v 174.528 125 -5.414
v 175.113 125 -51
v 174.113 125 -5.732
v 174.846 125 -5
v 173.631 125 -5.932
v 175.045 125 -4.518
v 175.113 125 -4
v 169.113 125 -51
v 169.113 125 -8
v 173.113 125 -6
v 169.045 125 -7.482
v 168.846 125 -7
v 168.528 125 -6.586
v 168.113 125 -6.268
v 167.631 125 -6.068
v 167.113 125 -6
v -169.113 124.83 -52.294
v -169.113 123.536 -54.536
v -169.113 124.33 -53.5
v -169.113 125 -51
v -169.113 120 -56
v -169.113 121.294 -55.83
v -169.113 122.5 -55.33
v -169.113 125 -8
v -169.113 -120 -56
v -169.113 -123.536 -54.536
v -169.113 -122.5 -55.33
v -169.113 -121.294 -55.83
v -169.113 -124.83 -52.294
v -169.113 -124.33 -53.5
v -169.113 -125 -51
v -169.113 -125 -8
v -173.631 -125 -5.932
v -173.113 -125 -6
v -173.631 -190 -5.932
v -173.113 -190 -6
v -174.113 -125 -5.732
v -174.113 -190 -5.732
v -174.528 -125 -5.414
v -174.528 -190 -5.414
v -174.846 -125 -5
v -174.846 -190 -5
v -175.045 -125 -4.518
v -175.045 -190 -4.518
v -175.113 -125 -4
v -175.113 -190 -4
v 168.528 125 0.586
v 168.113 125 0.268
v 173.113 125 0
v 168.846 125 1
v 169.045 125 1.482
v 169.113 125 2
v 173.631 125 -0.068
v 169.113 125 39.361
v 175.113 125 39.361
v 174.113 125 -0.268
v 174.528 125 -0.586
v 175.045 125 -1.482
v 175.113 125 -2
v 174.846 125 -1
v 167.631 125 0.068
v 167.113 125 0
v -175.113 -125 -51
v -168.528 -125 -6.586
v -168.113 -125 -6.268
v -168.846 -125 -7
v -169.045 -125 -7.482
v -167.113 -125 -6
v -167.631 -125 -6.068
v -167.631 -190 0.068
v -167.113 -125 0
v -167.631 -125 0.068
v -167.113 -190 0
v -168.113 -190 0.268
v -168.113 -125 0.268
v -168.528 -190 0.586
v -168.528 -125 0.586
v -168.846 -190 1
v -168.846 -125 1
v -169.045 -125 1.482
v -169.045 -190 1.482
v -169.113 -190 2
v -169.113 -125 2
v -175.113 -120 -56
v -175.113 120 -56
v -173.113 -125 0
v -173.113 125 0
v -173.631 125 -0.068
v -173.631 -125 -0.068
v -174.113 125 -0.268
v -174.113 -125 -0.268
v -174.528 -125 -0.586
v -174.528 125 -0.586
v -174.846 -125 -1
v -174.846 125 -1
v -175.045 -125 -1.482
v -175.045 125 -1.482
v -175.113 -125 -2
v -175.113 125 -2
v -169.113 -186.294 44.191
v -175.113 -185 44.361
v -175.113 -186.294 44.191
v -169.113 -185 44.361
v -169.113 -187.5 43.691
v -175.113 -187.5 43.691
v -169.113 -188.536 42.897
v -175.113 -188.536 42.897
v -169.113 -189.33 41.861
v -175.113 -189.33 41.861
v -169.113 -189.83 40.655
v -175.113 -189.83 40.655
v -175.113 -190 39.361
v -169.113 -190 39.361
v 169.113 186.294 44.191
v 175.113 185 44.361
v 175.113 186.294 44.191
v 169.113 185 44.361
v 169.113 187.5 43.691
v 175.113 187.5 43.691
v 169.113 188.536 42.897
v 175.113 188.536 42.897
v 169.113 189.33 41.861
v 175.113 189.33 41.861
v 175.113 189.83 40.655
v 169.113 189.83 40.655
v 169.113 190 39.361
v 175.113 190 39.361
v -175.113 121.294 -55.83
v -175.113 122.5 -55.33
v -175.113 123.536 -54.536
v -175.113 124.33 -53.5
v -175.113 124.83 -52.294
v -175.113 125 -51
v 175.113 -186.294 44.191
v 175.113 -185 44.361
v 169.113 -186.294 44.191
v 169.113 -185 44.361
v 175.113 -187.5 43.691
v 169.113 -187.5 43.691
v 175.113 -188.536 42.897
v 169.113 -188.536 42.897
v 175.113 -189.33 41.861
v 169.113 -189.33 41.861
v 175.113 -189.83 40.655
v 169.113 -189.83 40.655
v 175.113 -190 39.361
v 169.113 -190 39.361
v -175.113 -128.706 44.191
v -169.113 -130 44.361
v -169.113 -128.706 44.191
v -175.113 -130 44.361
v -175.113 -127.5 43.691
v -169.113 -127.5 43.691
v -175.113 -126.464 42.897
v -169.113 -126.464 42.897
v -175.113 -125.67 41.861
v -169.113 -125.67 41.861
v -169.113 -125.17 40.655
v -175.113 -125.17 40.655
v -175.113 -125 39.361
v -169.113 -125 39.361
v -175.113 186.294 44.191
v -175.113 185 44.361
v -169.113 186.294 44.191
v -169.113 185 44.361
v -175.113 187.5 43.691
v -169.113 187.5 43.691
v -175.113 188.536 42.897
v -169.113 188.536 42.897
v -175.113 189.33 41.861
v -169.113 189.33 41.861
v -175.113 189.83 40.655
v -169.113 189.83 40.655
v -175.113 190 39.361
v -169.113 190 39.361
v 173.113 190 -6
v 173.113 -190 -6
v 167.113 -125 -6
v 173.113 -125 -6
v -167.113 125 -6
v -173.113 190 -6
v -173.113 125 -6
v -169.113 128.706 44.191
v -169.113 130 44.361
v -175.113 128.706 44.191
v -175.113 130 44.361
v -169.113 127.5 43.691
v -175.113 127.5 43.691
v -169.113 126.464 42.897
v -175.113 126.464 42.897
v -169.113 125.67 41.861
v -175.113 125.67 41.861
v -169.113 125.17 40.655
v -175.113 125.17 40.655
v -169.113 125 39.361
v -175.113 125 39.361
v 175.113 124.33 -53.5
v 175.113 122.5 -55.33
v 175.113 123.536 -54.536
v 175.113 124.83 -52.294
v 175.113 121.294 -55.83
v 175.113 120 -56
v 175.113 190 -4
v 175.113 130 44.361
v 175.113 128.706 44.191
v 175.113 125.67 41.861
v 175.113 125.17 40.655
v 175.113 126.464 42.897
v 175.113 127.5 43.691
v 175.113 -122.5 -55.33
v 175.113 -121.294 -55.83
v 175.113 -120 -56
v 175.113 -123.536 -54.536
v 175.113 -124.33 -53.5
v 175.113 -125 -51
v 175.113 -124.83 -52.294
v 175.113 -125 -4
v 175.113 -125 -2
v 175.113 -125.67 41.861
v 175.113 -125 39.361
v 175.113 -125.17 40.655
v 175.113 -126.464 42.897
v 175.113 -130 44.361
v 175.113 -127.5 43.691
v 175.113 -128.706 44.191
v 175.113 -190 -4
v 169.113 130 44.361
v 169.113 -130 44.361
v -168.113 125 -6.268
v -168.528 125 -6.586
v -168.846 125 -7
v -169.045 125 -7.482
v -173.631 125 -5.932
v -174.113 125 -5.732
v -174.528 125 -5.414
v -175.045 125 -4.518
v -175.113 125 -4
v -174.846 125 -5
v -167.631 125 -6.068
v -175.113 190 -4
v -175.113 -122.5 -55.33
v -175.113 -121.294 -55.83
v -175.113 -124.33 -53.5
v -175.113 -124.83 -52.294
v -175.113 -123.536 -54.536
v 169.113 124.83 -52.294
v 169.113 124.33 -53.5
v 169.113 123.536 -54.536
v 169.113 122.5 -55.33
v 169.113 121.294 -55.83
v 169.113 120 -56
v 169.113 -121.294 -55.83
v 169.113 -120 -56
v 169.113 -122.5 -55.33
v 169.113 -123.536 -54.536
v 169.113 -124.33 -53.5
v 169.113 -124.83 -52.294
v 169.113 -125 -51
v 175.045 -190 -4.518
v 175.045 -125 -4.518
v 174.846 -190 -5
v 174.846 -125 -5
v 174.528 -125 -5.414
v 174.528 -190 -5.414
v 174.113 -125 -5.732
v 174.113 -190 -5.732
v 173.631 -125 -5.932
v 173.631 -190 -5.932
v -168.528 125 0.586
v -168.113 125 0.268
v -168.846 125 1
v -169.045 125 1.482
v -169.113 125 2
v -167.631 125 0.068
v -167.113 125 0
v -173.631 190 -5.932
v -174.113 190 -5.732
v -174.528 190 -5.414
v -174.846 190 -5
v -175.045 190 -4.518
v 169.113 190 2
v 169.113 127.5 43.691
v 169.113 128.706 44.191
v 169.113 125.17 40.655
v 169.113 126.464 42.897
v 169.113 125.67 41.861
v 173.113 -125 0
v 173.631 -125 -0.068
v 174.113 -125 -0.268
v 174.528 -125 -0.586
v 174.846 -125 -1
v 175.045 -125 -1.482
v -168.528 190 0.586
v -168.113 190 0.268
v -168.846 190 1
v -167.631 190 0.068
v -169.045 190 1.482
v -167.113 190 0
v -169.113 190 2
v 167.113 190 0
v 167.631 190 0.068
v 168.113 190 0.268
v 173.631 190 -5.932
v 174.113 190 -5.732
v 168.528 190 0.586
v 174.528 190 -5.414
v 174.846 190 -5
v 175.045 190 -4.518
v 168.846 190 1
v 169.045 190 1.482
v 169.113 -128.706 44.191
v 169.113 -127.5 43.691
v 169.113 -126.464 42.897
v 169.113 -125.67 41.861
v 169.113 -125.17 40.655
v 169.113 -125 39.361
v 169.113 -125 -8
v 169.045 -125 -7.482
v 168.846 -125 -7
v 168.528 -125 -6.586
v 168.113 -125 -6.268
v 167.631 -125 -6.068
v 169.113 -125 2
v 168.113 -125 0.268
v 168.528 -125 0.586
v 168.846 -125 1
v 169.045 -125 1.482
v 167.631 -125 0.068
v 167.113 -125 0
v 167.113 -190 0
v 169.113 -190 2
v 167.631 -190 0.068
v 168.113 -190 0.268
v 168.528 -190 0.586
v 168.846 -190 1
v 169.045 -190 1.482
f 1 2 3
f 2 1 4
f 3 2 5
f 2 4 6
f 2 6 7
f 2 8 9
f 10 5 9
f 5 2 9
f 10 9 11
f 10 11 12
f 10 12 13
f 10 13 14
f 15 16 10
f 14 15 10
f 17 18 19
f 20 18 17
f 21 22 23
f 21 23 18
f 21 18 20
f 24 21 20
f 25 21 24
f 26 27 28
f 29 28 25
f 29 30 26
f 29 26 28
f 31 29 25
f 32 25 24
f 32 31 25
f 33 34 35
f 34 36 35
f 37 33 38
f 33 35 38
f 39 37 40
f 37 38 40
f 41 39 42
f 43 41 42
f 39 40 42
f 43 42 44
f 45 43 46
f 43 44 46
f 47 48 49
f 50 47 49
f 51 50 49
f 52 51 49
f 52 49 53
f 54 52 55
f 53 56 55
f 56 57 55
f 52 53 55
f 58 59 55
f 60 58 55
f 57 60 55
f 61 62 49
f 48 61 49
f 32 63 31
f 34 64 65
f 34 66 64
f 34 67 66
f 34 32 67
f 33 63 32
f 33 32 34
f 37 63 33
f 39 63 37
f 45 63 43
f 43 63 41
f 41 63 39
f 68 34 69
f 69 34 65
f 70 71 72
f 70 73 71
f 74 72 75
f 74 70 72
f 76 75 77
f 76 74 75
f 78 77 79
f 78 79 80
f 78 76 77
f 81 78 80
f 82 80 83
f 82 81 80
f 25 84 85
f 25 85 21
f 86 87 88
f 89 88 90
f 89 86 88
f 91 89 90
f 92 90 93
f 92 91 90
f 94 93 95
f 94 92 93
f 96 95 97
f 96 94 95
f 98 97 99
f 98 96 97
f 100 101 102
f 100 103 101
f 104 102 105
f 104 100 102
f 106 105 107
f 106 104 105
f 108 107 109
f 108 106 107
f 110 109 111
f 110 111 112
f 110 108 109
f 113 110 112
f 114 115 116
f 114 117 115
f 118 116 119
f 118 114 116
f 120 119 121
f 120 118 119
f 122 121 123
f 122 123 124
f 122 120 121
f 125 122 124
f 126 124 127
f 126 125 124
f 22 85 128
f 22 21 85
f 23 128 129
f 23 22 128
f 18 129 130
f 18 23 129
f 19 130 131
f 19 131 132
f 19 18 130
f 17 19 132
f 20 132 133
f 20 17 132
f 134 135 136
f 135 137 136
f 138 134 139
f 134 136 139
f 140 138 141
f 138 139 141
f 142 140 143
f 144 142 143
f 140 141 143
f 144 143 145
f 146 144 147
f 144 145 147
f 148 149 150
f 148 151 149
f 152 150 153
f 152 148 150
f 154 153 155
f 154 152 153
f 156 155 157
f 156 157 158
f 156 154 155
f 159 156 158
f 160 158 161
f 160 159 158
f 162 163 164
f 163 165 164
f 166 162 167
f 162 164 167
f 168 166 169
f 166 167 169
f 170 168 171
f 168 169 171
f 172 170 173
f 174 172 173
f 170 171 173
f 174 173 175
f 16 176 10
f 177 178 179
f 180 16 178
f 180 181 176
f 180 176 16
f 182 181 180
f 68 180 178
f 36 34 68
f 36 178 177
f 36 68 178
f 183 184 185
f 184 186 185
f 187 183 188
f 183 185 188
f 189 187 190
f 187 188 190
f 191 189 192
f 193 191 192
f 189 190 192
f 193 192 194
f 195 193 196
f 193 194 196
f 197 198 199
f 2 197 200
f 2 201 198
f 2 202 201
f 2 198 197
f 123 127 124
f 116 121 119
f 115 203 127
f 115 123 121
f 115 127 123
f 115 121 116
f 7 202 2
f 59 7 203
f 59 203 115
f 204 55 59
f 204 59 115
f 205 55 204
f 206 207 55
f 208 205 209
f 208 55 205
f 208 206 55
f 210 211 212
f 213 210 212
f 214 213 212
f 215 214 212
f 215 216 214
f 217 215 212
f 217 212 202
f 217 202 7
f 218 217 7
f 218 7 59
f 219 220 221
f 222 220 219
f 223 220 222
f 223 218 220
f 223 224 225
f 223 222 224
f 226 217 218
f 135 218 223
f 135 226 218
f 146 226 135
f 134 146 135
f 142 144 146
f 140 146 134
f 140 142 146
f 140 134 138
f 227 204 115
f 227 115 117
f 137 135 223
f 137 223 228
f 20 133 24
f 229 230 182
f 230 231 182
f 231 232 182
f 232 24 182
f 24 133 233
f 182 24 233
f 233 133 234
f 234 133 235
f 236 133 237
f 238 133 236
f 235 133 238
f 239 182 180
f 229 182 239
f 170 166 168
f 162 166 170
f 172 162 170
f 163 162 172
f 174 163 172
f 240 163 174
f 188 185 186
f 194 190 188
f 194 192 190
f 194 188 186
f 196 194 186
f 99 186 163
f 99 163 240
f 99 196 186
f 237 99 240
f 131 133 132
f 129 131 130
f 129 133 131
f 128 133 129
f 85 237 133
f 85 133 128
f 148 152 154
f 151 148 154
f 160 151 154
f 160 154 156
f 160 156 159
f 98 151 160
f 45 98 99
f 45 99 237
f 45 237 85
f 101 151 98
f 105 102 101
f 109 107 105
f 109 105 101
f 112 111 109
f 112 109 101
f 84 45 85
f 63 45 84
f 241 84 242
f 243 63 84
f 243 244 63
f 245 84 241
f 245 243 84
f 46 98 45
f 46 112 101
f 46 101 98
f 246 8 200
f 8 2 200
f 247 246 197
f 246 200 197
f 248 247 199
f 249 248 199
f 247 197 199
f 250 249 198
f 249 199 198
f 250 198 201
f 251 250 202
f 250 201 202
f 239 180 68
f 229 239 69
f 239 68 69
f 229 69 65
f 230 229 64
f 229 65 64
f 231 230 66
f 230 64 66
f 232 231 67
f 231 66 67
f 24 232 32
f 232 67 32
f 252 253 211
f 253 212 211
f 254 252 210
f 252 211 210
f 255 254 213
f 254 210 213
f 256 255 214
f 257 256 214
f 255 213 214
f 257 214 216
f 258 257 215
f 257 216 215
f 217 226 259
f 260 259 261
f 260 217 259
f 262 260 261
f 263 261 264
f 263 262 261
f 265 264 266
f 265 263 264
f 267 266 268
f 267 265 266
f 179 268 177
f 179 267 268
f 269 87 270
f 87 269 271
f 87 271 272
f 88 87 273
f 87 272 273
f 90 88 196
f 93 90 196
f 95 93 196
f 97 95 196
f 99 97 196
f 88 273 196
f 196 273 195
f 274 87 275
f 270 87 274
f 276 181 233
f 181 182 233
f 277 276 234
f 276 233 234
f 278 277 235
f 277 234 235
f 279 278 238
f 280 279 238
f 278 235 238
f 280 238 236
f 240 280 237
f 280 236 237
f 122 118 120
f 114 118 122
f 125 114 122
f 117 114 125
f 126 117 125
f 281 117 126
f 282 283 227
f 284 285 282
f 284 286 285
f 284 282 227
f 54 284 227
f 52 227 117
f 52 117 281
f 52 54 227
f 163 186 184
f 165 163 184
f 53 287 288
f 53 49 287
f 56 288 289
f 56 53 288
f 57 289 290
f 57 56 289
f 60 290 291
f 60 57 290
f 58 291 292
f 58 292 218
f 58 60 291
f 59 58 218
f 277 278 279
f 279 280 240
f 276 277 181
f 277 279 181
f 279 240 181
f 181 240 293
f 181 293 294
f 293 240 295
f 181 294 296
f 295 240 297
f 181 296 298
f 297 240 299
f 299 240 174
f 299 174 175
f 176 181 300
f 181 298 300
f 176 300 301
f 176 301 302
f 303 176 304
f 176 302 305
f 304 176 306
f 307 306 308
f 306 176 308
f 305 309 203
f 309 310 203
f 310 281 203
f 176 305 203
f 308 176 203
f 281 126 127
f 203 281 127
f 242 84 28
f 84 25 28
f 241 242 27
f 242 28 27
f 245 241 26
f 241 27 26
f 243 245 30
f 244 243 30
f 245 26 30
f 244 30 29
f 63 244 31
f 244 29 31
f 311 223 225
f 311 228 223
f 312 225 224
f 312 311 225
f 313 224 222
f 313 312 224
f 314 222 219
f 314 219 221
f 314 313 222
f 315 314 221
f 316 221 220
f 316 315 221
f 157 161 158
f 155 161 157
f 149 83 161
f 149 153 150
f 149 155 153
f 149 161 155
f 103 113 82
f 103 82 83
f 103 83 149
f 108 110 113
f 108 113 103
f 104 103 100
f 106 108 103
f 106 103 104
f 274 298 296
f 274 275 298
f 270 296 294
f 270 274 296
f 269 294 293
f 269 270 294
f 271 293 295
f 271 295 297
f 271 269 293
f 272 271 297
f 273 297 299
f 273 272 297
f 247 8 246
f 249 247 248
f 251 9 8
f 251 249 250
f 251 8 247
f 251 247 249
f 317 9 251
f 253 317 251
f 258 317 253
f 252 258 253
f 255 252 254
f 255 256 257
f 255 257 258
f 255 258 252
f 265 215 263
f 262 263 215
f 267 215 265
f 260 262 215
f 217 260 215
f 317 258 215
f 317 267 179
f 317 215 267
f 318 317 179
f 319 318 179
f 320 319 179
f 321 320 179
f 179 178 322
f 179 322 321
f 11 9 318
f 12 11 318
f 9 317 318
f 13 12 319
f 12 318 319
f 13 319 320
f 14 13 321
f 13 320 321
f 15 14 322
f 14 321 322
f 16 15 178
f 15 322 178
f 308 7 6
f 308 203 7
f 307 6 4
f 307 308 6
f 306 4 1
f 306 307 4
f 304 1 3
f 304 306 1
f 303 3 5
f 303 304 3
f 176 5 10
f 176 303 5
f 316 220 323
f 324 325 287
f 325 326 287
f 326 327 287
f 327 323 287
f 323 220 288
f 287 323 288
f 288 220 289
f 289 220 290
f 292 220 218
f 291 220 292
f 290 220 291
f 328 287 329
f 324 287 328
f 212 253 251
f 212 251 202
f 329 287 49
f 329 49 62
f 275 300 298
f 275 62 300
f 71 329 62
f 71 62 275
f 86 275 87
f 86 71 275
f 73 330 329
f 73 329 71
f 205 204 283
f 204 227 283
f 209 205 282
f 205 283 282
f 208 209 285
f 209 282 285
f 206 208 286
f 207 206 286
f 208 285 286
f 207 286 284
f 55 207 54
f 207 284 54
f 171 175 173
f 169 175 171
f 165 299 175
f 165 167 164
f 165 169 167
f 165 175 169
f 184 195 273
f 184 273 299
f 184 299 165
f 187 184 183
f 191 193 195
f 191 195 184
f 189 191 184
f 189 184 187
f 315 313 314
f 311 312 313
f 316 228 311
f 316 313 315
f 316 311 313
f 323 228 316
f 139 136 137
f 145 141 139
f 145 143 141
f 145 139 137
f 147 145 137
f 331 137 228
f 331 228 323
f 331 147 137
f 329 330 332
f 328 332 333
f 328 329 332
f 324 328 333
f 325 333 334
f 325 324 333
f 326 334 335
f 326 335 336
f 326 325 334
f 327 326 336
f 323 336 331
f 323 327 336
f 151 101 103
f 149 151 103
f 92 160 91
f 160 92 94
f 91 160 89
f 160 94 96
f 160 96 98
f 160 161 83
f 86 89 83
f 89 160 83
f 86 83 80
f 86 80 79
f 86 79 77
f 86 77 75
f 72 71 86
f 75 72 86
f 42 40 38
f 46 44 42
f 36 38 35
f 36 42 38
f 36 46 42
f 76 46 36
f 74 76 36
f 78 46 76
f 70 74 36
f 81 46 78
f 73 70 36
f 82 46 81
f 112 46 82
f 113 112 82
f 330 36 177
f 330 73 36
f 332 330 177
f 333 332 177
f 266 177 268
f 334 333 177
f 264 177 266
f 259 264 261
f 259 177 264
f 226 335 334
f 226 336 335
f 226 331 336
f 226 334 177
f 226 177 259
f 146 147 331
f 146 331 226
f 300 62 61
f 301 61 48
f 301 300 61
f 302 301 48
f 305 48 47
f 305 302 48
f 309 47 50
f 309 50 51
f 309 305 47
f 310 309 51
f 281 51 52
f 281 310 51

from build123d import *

# Parameters (mm, degrees)
F0_W     = 6
F0_H     = 44.3611480296
F1_DEPTH = 190
F3_DEPTH = 500
F4_W     = 65
F4_H     = 50
F5_DEPTH = 500
F6_R     = 2
F7_R     = 5


with BuildPart() as f1:
    # F0 (on Front) → F1 (new body, symmetric)
    with BuildSketch(Plane.XZ):
        Polygon((169.1134991124, 0), (0, 0), (-169.1134991124, 0), (-175.1134991124, 0), (-175.1134991124, -56), (-169.1134991124, -56), (-169.1134991124, -6), (0, -6), (169.1134991124, -6), (169.1134991124, -56), (175.1134991124, -56), (175.1134991124, 0), (175.1134991124, 44.3611480296), (169.1134991124, 44.3611480296), align=None)
        with Locations((-172.1134991124, 22.1805740148)):
            Rectangle(F0_W, F0_H)
    extrude(amount=F1_DEPTH, both=True)

    # F2 (on face) → F3 (cut)
    with BuildSketch(Plane.YZ.offset(175.1134991124)):
        Polygon((-125, 0), (0, 0), (125, 0), (125, 44.3611480296), (-125, 44.3611480296), align=None)
    extrude(amount=-F3_DEPTH, mode=Mode.SUBTRACT)

    # F4 (on face) → F5 (cut)
    with BuildSketch(Plane(origin=(-175.1134991124, 0, 0), x_dir=(0, -1, 0), z_dir=(-1, 0, 0))):
        with Locations((-157.5, -31)):
            Rectangle(F4_W, F4_H)
        with Locations((157.5, -31)):
            Rectangle(F4_W, F4_H)
    extrude(amount=-F5_DEPTH, mode=Mode.SUBTRACT)

    # F6
    f6_edges = [f1.edges().sort_by_distance(p)[0] for p in [
        (169.113499, 157.5, 0),
        (169.113499, -157.5, 0),
        (175.113499, 0, 0),
        (169.113499, 0, -6),
        (175.113499, -157.5, -6),
        (175.113499, 157.5, -6),
        (-169.113499, 157.5, 0),
        (-169.113499, -157.5, 0),
        (-175.113499, 0, 0),
        (-175.113499, -157.5, -6),
        (-169.113499, 0, -6),
        (-175.113499, 157.5, -6),
    ]]
    fillet(f6_edges, radius=F6_R)

    # F7
    f7_edges = [f1.edges().sort_by_distance(p)[0] for p in [
        (172.113499, -190, 44.361148),
        (172.113499, -125, 44.361148),
        (-172.113499, -190, 44.361148),
        (-172.113499, -125, 44.361148),
        (-172.113499, 190, 44.361148),
        (-172.113499, 125, 44.361148),
        (172.113499, 125, 44.361148),
        (172.113499, 190, 44.361148),
        (172.113499, 125, -56),
        (172.113499, -125, -56),
        (-172.113499, -125, -56),
        (-172.113499, 125, -56),
    ]]
    fillet(f7_edges, radius=F7_R)


solid = f1.part
